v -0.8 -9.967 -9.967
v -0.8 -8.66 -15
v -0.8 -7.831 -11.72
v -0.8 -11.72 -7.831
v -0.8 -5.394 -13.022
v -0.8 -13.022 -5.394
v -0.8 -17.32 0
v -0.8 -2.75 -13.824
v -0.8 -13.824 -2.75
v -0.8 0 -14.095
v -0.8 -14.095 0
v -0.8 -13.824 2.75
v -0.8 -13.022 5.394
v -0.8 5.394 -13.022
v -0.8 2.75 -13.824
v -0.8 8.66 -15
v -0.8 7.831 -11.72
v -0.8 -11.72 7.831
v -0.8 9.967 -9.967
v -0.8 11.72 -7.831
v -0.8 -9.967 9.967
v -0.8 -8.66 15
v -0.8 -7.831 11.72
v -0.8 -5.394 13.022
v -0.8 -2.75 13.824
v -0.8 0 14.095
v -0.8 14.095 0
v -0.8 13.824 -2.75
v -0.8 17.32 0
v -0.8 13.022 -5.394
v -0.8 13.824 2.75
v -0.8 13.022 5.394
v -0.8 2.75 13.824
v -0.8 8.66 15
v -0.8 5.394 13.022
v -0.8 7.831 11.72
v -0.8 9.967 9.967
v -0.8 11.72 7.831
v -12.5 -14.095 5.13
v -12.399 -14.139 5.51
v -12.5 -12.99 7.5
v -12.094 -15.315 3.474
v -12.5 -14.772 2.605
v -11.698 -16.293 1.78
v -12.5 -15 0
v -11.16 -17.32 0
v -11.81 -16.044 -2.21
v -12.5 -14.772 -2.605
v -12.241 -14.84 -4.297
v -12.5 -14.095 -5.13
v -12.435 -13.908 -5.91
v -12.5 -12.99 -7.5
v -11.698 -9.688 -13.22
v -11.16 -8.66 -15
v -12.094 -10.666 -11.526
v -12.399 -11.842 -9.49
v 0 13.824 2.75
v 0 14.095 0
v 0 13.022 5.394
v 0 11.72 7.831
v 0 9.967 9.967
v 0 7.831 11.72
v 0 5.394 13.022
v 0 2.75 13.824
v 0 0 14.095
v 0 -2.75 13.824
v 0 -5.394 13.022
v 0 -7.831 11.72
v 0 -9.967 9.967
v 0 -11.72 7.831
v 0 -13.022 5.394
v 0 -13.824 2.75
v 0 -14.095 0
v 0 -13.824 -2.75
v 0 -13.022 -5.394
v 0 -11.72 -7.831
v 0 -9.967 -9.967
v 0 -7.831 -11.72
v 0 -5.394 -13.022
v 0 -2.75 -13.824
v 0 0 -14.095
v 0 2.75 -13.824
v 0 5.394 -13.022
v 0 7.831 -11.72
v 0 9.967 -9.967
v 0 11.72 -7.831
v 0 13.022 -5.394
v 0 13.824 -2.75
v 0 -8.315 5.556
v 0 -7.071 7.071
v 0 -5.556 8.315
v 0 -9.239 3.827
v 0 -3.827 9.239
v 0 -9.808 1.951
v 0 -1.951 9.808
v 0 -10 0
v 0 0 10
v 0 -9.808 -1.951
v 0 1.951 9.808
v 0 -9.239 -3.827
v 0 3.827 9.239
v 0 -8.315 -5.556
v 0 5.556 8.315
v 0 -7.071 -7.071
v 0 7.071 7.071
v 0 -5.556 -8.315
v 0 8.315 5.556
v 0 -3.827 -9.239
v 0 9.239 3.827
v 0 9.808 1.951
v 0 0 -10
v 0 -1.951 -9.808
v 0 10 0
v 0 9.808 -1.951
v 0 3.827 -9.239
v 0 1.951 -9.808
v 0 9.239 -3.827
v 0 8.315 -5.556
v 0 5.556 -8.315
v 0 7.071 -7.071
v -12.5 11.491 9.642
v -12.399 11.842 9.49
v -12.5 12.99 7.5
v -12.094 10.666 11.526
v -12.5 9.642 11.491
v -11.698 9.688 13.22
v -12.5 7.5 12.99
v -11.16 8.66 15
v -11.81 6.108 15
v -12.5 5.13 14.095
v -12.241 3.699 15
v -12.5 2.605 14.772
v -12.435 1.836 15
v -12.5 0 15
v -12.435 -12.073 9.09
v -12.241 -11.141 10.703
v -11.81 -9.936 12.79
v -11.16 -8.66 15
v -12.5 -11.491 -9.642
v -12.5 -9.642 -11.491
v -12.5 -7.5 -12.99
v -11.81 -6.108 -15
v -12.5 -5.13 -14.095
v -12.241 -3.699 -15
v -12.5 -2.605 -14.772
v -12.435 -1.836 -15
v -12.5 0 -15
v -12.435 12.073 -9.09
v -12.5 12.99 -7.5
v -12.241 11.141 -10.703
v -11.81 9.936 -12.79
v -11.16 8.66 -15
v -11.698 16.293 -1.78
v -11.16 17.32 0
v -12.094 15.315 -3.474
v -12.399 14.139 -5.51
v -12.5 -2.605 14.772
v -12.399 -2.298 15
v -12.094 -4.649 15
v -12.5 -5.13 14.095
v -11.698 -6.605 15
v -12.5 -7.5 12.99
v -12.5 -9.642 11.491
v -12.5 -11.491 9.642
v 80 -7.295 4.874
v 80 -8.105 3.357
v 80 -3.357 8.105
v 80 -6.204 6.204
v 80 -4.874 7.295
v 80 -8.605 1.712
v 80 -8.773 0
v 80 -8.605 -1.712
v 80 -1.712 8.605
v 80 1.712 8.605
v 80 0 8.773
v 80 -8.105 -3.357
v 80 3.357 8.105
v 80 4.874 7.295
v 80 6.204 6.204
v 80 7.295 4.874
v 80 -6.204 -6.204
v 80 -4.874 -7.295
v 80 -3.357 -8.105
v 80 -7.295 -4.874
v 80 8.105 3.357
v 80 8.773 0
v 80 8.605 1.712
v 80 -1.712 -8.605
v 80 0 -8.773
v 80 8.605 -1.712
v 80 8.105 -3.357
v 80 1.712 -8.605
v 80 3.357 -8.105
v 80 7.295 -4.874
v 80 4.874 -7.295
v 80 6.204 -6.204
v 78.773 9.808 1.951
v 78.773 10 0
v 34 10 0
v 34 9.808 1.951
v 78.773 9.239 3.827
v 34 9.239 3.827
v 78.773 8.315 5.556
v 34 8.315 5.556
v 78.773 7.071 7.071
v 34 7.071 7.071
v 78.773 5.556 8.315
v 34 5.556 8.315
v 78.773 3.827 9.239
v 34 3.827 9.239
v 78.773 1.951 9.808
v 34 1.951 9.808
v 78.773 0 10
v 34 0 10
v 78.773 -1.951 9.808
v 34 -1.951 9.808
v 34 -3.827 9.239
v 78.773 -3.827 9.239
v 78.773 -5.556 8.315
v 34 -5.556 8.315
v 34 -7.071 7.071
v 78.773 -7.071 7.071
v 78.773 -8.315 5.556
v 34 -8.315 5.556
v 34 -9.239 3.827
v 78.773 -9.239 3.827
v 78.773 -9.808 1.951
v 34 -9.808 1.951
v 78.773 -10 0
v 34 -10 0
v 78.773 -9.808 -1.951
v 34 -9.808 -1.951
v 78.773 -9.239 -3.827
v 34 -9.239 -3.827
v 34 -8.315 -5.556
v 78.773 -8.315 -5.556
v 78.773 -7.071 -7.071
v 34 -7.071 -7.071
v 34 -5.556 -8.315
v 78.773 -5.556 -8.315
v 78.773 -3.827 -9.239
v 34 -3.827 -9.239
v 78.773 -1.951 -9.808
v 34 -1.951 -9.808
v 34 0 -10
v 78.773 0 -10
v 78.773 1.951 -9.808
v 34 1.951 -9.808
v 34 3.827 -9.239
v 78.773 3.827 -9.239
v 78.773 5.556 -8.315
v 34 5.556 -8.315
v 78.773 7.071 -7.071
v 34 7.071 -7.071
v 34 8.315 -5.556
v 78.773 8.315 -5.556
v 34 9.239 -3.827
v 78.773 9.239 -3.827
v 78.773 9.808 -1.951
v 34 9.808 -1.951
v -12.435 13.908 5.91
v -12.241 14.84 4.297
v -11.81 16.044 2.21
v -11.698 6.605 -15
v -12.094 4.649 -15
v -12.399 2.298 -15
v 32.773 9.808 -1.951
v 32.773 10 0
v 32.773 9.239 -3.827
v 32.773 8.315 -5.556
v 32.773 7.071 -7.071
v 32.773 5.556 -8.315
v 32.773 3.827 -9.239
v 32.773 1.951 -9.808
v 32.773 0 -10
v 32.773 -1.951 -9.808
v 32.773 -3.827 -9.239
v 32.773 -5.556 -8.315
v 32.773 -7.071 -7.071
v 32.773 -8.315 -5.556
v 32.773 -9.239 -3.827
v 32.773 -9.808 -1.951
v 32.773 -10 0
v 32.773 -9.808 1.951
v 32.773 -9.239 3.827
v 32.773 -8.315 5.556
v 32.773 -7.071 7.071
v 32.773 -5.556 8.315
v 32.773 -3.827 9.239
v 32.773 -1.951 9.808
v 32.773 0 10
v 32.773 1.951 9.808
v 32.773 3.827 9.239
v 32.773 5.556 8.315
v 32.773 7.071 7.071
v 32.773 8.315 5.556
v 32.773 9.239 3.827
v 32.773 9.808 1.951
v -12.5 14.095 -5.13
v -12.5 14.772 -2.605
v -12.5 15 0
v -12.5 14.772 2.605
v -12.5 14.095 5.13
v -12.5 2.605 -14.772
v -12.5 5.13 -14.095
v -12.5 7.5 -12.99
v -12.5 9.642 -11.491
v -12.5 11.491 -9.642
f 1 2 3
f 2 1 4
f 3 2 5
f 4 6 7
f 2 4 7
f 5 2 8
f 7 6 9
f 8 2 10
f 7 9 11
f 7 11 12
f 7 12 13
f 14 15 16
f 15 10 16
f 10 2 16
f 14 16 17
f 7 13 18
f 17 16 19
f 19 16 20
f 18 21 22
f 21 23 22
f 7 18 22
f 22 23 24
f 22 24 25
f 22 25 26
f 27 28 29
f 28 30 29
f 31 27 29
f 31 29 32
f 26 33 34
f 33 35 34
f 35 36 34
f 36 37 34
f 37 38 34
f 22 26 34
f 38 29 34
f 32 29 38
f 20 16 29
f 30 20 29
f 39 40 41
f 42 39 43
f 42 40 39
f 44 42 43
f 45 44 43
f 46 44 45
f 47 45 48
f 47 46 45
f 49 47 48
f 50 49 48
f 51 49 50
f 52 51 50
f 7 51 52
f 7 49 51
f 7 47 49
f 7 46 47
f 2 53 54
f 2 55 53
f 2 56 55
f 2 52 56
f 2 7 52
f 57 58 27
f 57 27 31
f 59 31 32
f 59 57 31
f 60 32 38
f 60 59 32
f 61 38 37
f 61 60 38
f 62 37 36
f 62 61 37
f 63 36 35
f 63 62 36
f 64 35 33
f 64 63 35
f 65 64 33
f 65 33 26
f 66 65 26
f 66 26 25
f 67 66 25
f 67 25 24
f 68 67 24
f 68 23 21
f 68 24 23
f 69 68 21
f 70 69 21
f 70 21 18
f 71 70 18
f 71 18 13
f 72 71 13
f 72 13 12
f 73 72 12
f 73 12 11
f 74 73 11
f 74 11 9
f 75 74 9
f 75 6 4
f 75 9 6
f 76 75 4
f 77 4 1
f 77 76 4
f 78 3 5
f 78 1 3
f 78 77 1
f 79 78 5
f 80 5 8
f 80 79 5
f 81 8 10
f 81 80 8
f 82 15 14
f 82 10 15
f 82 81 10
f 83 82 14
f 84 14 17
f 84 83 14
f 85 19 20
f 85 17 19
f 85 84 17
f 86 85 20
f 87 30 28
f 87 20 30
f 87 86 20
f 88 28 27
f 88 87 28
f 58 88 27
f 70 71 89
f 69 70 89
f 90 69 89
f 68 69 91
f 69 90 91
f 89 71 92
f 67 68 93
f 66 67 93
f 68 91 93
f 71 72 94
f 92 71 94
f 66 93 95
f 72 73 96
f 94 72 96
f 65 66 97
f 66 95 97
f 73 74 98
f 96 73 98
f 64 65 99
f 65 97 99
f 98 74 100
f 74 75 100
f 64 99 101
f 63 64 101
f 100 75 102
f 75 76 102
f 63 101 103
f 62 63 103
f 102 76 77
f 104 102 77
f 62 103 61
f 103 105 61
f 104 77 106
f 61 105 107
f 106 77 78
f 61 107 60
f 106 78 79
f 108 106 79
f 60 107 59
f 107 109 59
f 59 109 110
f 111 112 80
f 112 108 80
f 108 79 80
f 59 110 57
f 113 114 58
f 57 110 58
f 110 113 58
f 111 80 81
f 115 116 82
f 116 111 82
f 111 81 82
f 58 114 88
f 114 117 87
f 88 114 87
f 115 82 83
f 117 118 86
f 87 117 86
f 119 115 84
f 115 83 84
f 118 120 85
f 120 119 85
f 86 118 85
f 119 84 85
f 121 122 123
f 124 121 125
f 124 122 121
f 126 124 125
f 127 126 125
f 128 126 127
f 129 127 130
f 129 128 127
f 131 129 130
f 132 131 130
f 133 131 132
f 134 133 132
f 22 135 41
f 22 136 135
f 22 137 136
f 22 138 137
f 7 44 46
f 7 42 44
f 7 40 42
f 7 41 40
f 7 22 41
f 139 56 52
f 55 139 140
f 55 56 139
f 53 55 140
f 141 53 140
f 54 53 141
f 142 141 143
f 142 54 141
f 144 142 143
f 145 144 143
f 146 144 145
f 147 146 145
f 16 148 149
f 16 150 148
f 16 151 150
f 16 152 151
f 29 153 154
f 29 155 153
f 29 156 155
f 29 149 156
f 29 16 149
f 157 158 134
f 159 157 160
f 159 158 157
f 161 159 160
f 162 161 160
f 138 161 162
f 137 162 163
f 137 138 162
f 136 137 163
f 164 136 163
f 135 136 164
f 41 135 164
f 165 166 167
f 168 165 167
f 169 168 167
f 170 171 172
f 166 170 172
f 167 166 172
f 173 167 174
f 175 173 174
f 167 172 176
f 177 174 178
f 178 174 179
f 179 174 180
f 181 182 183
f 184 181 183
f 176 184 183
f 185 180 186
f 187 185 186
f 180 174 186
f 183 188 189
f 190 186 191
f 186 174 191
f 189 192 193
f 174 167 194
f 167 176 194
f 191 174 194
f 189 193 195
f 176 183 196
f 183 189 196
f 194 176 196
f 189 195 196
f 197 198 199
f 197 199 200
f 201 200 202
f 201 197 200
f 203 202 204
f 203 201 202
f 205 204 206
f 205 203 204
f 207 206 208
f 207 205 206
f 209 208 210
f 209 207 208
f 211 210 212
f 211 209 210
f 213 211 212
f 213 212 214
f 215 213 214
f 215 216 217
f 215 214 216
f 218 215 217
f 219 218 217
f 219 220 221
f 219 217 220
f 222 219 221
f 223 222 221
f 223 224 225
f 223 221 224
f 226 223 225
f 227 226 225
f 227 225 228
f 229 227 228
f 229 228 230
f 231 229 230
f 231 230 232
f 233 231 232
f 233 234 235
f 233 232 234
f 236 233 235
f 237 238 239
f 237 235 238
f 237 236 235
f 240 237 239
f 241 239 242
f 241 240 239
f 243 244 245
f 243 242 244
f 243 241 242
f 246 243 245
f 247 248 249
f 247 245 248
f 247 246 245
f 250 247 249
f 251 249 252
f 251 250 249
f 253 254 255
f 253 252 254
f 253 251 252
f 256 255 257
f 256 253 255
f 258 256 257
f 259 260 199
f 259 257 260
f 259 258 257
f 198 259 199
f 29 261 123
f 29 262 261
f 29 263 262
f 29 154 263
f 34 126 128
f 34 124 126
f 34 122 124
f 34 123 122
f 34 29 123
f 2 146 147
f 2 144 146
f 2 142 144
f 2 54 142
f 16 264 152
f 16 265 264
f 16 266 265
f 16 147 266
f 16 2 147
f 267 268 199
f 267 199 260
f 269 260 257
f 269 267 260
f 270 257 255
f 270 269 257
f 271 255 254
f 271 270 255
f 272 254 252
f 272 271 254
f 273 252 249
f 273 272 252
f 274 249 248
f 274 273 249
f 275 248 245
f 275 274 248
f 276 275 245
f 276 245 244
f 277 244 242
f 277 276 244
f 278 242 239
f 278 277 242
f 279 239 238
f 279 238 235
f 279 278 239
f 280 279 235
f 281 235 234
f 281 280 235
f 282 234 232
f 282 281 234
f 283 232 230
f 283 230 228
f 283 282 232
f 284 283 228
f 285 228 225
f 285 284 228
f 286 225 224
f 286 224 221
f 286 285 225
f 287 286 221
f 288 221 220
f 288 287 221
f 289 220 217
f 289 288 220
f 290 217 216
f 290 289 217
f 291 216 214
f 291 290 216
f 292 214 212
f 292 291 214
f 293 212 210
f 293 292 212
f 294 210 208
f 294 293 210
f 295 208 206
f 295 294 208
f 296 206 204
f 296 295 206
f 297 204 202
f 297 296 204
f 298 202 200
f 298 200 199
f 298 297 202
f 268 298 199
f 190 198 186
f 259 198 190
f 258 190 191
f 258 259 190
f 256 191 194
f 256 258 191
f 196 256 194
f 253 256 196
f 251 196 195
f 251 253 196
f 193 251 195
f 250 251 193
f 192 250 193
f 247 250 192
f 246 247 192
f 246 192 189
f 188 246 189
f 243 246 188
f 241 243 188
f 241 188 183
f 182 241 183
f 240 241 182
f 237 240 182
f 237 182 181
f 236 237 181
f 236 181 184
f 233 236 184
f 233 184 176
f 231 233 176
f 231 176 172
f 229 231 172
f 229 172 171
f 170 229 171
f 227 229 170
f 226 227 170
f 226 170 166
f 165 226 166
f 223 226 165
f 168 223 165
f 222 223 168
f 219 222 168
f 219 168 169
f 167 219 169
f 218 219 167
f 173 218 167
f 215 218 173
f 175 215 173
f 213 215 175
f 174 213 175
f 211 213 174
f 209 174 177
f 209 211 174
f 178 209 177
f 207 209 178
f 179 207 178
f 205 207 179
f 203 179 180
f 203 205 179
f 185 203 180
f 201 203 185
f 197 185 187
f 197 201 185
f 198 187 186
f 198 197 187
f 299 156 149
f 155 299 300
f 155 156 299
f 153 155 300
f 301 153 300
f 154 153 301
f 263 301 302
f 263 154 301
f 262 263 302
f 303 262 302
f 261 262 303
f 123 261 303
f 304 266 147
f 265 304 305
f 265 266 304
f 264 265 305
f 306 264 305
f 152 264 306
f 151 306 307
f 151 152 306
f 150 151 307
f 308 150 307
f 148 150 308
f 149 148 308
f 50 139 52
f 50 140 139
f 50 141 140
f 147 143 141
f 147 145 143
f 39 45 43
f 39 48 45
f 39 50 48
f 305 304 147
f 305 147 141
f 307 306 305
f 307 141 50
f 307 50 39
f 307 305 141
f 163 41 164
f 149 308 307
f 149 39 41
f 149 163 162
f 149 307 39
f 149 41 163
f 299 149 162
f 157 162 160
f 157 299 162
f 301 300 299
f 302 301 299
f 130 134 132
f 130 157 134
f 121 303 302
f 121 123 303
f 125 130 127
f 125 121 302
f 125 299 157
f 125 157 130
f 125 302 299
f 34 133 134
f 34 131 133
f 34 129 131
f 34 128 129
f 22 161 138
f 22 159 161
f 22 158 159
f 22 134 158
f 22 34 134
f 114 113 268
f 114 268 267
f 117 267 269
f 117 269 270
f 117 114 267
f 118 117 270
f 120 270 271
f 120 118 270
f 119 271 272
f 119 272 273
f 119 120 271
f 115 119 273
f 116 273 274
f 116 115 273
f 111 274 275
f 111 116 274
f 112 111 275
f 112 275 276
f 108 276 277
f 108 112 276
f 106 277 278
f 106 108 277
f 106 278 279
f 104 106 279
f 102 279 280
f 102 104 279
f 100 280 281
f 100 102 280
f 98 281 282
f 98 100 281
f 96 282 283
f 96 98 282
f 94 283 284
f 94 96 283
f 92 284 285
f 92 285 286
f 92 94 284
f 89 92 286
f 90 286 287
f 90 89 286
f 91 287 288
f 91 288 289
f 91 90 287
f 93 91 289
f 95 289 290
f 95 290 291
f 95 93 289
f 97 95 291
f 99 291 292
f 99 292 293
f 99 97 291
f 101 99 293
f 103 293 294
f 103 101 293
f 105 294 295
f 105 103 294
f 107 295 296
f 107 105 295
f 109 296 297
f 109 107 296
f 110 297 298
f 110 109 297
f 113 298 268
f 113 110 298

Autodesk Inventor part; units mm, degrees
ref_plane "YZ Plane" through (0, 0, 0) normal (1, 0, 0) x (0, 1, 0)
ref_plane "XZ Plane" through (0, 0, 0) normal (0, 1, 0) x (-1, 0, 0)
sketch "Sketch1" plane through (0, 0, 0) normal (0, 0, 1) x (1, 0, 0)
  line L0 (0, 14.095) -> (0, 10)
  line L1 (34, 10) -> (80, 10)
  line L2 (80, 10) -> (80, 0)
  line L3 (80, 0) -> (-0.8001, 0)
  line L4 (-16.9601, 0) -> (96.16, 0) projected
  line L5 (-0.8001, 0) -> (-0.8001, 14.095)
  line L6 (-0.8001, 14.095) -> (0, 14.095)
  line L7 (34, 10) -> (32.773, 10)
  line L8 (32.773, 10) -> (0, 10)
  line L9 (0, -2.819) -> (0, 16.914) projected
  dimension "d0" = 80
  dimension "d1" = 46
  dimension "d2" = 20
  dimension "d9" = 0.8001
  dimension "d10" = 28.19
  dimension "d13" = 1.227
  dimension "d14" = 20
revolve "Body" add sketch "Sketch1" angle 360 about axis through (80, 0, 0) along (-1, 0, 0)
sketch "Sketch2" plane through (-0.8001, 0, 0) normal (-1, 0, 0) x (0, 0, 1)
  line L0 (0, 17.3205) -> (15, 8.6603)
  line L1 (15, 8.6603) -> (15, -8.6603)
  line L2 (15, -8.6603) -> (0, -17.3205)
  line L3 (0, -17.3205) -> (-15, -8.6603)
  line L4 (-15, -8.6603) -> (-15, 8.6603)
  line L5 (-15, 8.6603) -> (0, 17.3205)
  point P0 (0, 0)
  point P1 (0, 0)
  dimension "d11" = 30
extrude "Head" add sketch "Sketch2" along normal blind 11.7
sketch "Sketch4" plane through (0, 0, 0) normal (0, 0, 1) x (1, 0, 0)
  line L0 (-12.5001, 15) -> (-12.5001, 17.3205)
  line L1 (-12.5001, 17.3205) -> (-11.1604, 17.3205)
  line L2 (-11.1604, 17.3205) -> (-12.5001, 15)
  line L3 (-14.8401, 0) -> (1.5399, 0) projected
  line L4 (-0.8001, 17.3205) -> (-12.5001, 17.3205) projected
  line L5 (-12.5001, 8.6603) -> (-12.5001, 17.3205) projected
  dimension "d5" = 30
  dimension "d19" = 30
revolve "Chamfer1" cut sketch "Sketch4" angle 360 about axis through (-10, 0, 0) along (1, 0, 0)
thread "Thread" size "M20x2" class "6g" standard "ISO Metric profile" length 46
chamfer "Chamfer2" distance 1.2269 distance2 1.227 1 edges at (80, -10, 0) measured on face at (80, -2.8768, 3.7595)
ref_plane "Work Plane1" through (1.525, 0, 0) normal (0, 0, 1) x (1, 0, 0)
equation "\"d0\" = NLG"
equation "\"d1\" = GEL"
equation "\"d2\" = GD"
equation "\"d10\" = SD2"
equation "\"d14\" = BDM"
equation "\"d11\" = SW"
equation "\"d3\" = KOH - SD"
equation "\"d5\" = ANG1"
equation "\"d19\" = SW0"
equation "\"d15\" = GEL"
equation "\"d6\" = -0.5 * SPD + 0.5 * GD"
equation "\"NLG\" = 80"
equation "\"GD\" = NND"
equation "\"BDM\" = NND"
equation "\"KOH\" = 12.5"
equation "\"GEL\" = 46"
equation "\"SW\" = 30"
equation "\"SW0\" = SW"
equation "\"SPD\" = NND - 1.2269 * PTC"
equation "\"SD2\" = 28.19"
equation "\"SD\" = 0.8"
equation "\"ANG1\" = 30deg"
equation "\"GAL\" = 0.61345 * PTC"
equation "\"GUL\" = 0.61345 * PTC"
equation "\"RR\" = 0.8"
equation "\"GD1\" = THREADDIA - 1.2269 * PTC"
equation "\"SDH\" = SD2"
equation "\"TOA\" = 30deg"
equation "\"PTC\" = 2"
equation "\"E0\" = 1.155 * SW"
equation "\"NND\" = 20"
equation "\"THREADDIA\" = 20"
properties part number "ISO 8765 - M20 x 2 x 80" material "Stainless Steel, 440C"
